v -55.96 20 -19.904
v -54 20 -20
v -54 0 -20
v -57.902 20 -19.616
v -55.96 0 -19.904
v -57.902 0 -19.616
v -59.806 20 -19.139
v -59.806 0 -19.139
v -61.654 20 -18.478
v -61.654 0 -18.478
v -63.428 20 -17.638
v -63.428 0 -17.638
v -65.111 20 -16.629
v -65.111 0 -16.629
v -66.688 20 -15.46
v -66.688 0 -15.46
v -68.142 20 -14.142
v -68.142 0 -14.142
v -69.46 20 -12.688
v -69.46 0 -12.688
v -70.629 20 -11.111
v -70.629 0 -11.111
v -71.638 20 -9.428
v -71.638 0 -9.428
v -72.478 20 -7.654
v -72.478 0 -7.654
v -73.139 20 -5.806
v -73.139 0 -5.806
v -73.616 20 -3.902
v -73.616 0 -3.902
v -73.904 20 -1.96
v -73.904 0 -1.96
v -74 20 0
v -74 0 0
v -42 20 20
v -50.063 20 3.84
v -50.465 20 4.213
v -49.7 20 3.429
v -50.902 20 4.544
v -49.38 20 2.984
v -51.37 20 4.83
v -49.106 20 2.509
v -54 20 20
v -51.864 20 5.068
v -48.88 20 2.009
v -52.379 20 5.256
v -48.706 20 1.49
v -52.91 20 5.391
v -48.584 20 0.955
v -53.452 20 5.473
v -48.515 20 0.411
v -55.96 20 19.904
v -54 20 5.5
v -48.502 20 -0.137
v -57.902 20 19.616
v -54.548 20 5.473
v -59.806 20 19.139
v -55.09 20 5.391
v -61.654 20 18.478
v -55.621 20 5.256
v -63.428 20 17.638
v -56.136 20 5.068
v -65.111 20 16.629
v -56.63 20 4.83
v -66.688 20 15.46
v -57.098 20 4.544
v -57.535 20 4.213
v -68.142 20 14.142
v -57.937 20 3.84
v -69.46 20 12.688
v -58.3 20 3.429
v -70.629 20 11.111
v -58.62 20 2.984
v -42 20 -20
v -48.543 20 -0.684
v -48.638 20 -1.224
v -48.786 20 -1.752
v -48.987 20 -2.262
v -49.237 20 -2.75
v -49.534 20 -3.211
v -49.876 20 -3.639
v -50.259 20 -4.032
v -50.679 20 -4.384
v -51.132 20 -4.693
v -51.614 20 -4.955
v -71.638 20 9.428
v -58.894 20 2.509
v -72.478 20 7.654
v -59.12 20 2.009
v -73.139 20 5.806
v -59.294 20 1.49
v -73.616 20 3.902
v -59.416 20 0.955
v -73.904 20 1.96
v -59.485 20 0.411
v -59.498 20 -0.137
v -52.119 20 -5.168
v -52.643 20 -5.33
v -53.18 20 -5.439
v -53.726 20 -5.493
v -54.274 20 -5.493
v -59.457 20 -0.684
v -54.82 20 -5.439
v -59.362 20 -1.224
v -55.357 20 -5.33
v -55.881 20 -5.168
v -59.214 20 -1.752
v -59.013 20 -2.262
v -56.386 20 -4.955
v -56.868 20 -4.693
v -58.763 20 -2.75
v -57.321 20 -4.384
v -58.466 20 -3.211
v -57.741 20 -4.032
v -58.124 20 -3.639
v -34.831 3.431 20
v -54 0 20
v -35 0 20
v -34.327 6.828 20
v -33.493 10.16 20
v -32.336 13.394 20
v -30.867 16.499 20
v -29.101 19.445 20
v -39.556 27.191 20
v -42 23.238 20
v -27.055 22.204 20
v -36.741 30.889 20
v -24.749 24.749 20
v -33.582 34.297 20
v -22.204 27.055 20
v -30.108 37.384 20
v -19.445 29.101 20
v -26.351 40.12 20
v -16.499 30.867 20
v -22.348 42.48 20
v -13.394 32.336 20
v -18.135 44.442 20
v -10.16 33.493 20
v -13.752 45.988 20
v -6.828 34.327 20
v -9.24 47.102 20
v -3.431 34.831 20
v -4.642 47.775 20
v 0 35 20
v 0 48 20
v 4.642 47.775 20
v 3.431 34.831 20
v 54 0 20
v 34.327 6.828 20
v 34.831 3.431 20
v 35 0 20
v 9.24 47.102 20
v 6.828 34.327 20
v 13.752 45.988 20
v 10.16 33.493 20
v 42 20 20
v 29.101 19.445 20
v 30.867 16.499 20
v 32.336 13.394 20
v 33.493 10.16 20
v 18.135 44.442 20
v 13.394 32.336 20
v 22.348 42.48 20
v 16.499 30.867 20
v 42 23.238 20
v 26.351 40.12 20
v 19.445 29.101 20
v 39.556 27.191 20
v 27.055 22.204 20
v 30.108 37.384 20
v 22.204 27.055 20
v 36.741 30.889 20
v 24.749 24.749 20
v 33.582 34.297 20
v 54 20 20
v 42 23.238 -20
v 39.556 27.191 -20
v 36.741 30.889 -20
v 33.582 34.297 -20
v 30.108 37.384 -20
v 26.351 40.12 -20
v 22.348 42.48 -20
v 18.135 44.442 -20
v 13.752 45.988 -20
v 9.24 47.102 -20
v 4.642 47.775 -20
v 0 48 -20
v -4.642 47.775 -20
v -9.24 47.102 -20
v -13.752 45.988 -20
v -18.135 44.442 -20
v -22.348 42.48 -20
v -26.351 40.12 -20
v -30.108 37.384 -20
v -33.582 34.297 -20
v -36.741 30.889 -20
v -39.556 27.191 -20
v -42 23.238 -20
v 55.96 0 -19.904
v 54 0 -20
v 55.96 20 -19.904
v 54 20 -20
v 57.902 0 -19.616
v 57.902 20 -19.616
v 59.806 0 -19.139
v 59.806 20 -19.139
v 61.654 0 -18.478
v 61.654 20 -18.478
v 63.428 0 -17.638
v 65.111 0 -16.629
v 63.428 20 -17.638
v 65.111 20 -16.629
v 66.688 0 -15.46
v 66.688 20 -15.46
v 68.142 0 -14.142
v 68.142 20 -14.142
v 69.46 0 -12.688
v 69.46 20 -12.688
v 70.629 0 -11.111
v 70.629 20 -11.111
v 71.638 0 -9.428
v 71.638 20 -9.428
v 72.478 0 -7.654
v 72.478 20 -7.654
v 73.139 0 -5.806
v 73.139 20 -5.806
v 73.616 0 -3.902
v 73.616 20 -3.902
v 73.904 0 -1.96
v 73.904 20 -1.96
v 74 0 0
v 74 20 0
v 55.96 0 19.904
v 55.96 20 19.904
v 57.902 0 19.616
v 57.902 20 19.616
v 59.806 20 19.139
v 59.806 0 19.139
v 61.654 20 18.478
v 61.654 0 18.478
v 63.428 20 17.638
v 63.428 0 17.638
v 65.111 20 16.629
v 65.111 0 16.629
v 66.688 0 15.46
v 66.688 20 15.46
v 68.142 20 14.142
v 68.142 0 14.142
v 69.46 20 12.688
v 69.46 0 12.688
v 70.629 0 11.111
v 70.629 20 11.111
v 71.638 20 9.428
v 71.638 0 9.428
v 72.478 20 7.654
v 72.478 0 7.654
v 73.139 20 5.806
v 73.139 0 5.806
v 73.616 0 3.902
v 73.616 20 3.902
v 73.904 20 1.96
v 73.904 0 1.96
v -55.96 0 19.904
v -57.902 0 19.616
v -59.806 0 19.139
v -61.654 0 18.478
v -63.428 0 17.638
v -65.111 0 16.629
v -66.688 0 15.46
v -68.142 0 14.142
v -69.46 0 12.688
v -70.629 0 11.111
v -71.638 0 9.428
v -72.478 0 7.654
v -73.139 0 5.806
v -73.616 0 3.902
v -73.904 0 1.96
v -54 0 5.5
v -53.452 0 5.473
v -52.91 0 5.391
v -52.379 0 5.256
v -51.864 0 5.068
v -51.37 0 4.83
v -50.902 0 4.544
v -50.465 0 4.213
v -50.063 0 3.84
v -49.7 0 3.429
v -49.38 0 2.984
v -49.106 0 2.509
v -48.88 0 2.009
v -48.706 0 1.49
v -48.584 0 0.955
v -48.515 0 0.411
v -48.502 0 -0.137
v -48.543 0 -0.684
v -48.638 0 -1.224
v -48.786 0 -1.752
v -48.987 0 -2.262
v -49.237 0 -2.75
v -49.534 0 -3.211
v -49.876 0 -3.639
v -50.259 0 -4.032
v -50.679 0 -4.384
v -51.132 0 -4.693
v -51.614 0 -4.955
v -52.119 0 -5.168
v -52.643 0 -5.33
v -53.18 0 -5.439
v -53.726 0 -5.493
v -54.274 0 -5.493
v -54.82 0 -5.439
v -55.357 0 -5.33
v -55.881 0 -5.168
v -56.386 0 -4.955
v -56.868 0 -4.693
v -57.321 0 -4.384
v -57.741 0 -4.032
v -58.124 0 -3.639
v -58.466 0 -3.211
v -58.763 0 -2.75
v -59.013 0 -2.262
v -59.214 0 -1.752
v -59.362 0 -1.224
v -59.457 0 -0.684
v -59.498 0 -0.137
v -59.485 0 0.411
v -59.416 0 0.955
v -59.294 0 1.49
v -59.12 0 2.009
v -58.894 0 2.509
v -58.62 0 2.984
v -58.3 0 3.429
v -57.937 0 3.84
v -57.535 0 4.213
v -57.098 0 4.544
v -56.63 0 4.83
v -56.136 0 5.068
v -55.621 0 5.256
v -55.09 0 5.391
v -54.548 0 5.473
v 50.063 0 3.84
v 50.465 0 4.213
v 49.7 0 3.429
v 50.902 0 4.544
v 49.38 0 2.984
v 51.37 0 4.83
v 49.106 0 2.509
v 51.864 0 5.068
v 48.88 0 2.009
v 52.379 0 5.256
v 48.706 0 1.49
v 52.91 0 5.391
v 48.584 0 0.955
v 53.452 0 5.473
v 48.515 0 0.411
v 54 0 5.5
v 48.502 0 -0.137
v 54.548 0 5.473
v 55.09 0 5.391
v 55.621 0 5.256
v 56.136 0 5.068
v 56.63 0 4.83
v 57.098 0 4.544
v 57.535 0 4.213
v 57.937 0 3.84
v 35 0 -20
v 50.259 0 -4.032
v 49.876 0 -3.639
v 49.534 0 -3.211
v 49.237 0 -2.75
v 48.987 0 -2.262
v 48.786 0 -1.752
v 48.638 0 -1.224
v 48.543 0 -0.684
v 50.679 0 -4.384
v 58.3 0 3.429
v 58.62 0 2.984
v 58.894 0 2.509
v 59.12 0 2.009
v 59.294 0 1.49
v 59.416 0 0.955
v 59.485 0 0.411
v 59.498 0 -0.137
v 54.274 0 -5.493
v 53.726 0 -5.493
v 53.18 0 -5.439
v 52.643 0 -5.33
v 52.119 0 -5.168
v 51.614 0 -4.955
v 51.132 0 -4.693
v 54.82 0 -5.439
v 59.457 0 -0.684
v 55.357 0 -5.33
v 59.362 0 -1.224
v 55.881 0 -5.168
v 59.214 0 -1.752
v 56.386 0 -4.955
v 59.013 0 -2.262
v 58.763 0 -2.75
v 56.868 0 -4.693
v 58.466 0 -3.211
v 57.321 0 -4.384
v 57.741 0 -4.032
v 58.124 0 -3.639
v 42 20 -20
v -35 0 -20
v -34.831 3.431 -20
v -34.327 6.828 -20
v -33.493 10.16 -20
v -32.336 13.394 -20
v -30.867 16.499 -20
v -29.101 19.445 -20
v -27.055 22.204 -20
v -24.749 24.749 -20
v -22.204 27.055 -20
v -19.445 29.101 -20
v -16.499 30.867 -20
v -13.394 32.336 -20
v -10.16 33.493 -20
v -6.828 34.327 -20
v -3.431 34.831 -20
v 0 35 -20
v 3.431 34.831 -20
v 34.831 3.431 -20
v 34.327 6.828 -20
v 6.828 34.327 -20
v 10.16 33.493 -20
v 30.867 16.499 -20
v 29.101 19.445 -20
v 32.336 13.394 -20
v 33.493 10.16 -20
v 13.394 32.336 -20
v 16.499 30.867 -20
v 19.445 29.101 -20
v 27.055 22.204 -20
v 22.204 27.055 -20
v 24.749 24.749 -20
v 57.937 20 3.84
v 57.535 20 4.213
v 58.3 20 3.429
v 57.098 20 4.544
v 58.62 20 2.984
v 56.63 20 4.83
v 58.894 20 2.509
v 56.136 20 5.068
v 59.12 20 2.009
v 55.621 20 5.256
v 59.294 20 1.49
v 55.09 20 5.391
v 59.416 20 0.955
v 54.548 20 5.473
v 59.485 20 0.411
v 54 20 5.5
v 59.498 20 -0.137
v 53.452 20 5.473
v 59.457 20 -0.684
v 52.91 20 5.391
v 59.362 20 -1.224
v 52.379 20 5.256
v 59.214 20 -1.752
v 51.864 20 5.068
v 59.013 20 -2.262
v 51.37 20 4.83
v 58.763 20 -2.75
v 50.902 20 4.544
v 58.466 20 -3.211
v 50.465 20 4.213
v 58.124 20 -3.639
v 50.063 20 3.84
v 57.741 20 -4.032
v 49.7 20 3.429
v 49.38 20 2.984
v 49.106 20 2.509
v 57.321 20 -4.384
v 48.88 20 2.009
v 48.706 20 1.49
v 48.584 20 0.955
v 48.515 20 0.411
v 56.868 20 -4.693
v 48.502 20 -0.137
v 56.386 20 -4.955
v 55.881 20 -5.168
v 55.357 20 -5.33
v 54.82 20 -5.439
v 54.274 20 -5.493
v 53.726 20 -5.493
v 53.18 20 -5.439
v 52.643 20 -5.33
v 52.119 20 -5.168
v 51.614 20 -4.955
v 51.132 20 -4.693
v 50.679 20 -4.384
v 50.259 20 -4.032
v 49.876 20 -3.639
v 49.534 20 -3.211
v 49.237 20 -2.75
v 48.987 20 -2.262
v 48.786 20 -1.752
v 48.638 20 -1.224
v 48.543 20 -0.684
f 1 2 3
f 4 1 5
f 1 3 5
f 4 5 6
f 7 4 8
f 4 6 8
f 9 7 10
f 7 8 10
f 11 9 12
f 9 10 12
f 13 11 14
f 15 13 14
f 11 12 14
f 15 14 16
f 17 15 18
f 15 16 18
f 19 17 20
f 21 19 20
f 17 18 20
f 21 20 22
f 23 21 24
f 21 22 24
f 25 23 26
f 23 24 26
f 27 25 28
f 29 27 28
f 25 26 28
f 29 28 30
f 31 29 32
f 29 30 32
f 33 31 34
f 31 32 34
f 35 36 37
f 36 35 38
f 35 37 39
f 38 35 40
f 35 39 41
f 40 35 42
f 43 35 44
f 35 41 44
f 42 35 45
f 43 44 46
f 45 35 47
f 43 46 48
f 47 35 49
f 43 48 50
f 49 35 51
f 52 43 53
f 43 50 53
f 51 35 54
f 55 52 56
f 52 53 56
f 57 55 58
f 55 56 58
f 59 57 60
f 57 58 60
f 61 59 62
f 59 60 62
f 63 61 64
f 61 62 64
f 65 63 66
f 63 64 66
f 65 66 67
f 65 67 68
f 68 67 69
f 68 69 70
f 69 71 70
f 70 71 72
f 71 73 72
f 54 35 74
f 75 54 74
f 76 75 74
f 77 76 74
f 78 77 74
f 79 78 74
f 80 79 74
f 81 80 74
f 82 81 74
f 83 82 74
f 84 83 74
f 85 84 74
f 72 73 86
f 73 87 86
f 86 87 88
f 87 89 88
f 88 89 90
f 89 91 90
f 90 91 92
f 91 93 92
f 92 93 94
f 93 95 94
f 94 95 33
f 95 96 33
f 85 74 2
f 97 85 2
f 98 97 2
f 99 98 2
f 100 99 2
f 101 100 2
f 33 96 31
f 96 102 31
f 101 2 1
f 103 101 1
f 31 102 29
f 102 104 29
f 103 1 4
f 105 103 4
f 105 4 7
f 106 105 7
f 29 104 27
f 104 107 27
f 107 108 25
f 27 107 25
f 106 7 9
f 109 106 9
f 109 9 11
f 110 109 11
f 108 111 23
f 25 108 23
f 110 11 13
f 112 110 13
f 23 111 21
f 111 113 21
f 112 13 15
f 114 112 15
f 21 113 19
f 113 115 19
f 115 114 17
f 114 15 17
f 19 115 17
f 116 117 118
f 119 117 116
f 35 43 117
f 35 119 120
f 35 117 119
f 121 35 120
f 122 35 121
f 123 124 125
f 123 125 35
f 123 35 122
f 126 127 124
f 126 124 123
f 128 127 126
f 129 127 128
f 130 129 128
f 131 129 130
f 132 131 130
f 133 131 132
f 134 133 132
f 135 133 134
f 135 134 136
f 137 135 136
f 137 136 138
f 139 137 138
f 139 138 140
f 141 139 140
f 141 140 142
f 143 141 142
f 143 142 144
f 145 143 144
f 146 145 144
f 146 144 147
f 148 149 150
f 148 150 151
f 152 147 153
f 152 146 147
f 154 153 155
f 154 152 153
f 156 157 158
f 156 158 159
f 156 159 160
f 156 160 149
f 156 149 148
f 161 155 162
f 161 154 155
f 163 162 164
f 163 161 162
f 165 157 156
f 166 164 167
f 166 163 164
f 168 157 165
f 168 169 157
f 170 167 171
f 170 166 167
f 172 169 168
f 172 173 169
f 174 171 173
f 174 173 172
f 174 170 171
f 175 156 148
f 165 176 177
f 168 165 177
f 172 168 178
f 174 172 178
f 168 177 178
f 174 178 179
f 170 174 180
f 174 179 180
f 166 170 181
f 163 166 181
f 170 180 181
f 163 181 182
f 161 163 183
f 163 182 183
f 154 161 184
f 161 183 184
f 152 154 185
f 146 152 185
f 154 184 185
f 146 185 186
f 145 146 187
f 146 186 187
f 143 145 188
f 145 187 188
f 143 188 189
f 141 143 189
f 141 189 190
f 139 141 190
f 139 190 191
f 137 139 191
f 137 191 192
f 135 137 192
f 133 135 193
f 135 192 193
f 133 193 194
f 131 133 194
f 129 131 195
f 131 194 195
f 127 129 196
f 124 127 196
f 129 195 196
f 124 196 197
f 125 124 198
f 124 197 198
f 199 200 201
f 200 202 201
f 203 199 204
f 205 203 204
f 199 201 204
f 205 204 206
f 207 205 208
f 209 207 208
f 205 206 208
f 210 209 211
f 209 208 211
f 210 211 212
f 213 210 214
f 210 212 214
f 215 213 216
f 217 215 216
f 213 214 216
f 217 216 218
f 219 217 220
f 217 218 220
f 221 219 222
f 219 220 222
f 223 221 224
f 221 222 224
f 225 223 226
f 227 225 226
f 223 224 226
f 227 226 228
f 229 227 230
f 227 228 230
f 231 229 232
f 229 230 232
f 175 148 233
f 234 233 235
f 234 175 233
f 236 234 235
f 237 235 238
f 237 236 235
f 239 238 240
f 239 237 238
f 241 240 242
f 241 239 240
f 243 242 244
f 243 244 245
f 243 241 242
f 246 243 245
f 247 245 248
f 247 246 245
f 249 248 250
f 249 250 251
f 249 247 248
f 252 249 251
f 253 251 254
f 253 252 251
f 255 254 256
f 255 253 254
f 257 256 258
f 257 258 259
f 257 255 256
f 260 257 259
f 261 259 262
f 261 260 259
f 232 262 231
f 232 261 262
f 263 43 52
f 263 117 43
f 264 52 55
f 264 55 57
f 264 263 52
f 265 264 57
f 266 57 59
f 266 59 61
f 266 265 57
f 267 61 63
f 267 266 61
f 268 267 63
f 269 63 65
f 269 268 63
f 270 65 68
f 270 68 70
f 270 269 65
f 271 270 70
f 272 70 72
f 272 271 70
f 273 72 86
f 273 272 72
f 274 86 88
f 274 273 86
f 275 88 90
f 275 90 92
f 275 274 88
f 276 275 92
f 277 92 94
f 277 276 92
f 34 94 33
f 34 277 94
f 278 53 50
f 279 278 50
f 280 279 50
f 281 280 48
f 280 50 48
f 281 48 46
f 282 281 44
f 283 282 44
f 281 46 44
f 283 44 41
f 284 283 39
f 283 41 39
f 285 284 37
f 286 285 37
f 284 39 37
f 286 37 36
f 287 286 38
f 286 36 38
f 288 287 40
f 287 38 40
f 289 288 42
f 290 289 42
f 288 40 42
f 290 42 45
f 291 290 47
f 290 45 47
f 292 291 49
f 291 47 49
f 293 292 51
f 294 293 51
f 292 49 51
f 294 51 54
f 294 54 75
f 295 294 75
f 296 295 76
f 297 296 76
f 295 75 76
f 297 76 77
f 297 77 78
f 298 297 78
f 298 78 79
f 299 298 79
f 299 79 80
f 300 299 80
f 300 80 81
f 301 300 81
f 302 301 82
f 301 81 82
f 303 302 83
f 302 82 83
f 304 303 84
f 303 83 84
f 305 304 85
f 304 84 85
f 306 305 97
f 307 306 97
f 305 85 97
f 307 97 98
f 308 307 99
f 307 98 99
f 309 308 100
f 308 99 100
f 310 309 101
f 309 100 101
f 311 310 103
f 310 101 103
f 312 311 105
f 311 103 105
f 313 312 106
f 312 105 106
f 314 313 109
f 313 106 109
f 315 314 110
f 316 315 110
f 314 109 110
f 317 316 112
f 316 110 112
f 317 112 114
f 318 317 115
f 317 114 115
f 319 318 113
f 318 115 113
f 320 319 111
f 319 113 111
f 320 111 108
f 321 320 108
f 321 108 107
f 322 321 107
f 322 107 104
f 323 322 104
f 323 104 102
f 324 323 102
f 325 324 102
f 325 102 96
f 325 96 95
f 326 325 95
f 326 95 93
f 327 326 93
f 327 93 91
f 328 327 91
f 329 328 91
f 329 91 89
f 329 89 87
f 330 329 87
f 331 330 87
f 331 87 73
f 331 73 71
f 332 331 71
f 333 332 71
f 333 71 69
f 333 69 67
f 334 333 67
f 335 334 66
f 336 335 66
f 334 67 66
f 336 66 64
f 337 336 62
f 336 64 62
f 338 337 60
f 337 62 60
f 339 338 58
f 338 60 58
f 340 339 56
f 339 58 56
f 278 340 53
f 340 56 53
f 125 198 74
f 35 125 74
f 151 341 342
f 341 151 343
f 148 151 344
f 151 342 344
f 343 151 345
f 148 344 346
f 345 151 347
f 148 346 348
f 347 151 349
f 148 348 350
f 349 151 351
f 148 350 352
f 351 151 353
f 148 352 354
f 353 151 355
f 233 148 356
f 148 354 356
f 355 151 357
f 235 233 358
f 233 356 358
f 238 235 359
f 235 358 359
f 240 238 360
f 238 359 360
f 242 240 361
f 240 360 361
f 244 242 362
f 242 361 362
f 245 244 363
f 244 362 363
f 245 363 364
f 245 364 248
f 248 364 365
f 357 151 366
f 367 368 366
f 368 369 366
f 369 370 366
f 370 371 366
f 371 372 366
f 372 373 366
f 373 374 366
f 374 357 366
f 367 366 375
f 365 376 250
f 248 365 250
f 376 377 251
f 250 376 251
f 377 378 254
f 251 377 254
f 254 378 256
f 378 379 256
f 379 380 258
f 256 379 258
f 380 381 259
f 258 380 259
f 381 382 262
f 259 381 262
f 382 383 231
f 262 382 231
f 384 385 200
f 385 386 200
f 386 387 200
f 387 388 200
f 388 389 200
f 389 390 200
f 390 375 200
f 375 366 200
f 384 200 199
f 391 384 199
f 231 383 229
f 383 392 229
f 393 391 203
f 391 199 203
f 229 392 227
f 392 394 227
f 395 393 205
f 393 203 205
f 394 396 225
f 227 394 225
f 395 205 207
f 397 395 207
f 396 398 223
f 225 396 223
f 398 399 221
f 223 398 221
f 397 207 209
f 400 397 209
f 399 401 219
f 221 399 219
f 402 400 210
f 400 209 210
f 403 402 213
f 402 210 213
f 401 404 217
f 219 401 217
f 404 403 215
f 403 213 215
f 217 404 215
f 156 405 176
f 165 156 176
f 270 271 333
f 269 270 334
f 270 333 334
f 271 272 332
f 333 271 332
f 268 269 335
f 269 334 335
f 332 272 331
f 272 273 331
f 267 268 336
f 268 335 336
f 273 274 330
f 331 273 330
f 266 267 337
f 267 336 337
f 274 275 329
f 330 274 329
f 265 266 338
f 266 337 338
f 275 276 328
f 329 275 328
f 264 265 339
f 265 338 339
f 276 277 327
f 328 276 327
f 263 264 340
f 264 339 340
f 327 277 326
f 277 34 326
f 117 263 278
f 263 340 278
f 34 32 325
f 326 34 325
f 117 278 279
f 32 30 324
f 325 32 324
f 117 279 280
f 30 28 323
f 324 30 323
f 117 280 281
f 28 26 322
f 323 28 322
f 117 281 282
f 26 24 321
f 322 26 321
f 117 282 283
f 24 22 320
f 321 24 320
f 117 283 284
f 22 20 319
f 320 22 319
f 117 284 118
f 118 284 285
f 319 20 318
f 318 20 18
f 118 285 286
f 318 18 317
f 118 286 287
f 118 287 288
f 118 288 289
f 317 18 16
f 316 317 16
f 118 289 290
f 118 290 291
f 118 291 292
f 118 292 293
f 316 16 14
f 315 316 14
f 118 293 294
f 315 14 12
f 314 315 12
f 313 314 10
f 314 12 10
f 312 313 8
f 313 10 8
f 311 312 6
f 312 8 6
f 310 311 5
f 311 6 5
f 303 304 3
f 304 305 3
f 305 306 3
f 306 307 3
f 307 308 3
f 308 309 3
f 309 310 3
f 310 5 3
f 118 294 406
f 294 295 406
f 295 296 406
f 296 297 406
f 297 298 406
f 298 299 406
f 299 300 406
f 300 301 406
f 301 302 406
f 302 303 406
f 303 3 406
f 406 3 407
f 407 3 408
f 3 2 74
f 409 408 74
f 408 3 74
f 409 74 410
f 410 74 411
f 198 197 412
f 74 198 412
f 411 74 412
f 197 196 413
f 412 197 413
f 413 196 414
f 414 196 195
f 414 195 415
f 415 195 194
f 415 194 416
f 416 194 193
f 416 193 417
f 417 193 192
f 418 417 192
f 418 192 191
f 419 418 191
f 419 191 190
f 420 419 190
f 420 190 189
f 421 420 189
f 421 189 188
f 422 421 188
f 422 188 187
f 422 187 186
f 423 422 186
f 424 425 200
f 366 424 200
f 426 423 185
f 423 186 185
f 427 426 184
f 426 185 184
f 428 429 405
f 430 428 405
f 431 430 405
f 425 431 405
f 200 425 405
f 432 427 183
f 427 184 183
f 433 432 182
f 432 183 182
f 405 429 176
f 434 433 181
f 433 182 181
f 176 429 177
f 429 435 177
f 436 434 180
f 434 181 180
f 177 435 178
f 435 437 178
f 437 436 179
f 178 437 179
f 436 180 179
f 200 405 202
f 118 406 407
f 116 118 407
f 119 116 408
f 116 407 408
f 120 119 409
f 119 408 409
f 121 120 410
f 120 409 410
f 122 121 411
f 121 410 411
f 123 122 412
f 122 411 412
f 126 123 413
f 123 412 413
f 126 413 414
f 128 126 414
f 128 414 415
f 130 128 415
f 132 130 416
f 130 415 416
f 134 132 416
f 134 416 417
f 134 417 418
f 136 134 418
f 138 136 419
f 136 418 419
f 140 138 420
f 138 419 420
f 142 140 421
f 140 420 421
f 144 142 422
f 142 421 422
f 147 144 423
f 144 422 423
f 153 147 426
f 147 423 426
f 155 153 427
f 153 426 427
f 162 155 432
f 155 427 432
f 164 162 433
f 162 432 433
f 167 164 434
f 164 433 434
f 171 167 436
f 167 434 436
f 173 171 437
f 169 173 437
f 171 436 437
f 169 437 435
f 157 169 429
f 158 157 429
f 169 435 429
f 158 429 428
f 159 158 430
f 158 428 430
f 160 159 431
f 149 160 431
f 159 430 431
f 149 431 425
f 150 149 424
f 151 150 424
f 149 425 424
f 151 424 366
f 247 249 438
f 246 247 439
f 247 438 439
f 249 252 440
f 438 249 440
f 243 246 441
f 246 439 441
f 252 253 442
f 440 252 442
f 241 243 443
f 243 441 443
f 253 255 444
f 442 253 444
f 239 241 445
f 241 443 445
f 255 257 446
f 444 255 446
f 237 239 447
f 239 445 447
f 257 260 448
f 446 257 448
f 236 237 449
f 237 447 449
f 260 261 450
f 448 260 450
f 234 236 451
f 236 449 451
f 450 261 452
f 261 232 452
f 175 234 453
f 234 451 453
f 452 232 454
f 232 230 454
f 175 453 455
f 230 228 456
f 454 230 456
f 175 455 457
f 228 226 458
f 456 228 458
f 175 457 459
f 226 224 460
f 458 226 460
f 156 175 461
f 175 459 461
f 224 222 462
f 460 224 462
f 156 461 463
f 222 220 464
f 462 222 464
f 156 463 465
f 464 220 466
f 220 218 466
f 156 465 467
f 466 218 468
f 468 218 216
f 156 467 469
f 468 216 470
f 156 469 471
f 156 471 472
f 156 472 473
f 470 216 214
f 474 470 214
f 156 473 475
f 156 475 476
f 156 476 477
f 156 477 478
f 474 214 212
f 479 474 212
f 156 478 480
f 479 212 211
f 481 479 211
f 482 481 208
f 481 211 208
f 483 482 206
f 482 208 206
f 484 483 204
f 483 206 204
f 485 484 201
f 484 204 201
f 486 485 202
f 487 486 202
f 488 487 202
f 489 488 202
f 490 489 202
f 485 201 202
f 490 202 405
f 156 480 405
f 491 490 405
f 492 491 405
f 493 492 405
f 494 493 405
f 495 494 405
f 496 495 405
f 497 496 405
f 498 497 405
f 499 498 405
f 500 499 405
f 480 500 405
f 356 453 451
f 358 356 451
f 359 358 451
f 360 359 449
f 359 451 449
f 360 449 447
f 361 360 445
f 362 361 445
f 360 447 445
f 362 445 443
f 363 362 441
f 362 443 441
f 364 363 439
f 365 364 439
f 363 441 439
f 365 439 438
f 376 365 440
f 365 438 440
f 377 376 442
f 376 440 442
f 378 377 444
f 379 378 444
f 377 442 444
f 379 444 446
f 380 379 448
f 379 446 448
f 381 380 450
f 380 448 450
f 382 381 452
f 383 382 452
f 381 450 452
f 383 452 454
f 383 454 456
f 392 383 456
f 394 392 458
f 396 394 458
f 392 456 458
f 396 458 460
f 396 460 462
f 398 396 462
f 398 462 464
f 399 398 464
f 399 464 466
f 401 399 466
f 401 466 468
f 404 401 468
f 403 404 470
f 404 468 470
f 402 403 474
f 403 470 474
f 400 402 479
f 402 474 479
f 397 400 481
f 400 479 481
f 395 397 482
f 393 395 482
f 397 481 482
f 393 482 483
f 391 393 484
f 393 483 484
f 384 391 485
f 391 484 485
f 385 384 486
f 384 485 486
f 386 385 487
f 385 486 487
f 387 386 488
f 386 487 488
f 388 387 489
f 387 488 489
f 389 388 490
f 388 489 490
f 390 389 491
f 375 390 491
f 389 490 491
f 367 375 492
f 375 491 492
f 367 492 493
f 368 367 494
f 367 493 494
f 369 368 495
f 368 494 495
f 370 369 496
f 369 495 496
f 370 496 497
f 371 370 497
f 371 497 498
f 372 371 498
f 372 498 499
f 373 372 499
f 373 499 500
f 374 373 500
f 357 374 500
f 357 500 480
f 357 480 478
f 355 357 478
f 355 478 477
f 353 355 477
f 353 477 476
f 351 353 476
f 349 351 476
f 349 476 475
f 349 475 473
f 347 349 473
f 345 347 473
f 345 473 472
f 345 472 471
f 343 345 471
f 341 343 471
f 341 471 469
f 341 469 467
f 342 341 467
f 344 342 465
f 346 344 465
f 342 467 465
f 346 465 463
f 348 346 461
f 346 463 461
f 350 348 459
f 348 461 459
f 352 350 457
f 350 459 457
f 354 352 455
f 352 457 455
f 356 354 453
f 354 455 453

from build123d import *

# Parameters (mm, degrees)
BOSS_EXTRUDE1_DEPTH      = 20
BOSS_EXTRUDE1_DEPTH_BACK = 20
SKETCH7_R                = 5.5
CUT_EXTRUDE5_DEPTH       = 20
FILLET8_R                = 20


with BuildPart() as part:
    # Sketch1 → Boss-Extrude1 (new, two sides: drawn at the far end of the back side and taken through both)
    with BuildSketch(Plane.XY.offset(-BOSS_EXTRUDE1_DEPTH_BACK)):
        with BuildLine():
            Line((35, 0), (74, 0))
            Line((74, 0), (74, 20))
            Line((74, 20), (42, 20))
            Line((42, 20), (42, 23.237900077))
            ThreePointArc((42, 23.237900077), (0, 48), (-42, 23.237900077))
            Line((-42, 23.237900077), (-42, 20))
            Line((-42, 20), (-74, 20))
            Line((-74, 20), (-74, 0))
            Line((-74, 0), (-35, 0))
            ThreePointArc((-35, 0), (0, 35), (35, 0))
        make_face()
    extrude(amount=BOSS_EXTRUDE1_DEPTH + BOSS_EXTRUDE1_DEPTH_BACK)

    # Sketch7 → Cut-Extrude5 (cut)
    with BuildSketch(Plane(origin=(0, 20, 0), x_dir=(1, 0, 0), z_dir=(0, 1, 0))):
        with Locations(Location((54, 0, 0), (0, 0, 270))):
            Circle(SKETCH7_R)
        with Locations(Location((-54, 0, 0), (0, 0, 270))):
            Circle(SKETCH7_R)
    extrude(amount=-CUT_EXTRUDE5_DEPTH, mode=Mode.SUBTRACT)

    # Fillet8
    fillet8_edges = [part.edges().sort_by_distance(p)[0] for p in [
        (-74, 10, -20),
        (-74, 10, 20),
        (74, 10, -20),
        (74, 10, 20),
    ]]
    fillet(fillet8_edges, radius=FILLET8_R - 0.0001)  # a hair under: the kernel refuses the full size


solid = part.part
